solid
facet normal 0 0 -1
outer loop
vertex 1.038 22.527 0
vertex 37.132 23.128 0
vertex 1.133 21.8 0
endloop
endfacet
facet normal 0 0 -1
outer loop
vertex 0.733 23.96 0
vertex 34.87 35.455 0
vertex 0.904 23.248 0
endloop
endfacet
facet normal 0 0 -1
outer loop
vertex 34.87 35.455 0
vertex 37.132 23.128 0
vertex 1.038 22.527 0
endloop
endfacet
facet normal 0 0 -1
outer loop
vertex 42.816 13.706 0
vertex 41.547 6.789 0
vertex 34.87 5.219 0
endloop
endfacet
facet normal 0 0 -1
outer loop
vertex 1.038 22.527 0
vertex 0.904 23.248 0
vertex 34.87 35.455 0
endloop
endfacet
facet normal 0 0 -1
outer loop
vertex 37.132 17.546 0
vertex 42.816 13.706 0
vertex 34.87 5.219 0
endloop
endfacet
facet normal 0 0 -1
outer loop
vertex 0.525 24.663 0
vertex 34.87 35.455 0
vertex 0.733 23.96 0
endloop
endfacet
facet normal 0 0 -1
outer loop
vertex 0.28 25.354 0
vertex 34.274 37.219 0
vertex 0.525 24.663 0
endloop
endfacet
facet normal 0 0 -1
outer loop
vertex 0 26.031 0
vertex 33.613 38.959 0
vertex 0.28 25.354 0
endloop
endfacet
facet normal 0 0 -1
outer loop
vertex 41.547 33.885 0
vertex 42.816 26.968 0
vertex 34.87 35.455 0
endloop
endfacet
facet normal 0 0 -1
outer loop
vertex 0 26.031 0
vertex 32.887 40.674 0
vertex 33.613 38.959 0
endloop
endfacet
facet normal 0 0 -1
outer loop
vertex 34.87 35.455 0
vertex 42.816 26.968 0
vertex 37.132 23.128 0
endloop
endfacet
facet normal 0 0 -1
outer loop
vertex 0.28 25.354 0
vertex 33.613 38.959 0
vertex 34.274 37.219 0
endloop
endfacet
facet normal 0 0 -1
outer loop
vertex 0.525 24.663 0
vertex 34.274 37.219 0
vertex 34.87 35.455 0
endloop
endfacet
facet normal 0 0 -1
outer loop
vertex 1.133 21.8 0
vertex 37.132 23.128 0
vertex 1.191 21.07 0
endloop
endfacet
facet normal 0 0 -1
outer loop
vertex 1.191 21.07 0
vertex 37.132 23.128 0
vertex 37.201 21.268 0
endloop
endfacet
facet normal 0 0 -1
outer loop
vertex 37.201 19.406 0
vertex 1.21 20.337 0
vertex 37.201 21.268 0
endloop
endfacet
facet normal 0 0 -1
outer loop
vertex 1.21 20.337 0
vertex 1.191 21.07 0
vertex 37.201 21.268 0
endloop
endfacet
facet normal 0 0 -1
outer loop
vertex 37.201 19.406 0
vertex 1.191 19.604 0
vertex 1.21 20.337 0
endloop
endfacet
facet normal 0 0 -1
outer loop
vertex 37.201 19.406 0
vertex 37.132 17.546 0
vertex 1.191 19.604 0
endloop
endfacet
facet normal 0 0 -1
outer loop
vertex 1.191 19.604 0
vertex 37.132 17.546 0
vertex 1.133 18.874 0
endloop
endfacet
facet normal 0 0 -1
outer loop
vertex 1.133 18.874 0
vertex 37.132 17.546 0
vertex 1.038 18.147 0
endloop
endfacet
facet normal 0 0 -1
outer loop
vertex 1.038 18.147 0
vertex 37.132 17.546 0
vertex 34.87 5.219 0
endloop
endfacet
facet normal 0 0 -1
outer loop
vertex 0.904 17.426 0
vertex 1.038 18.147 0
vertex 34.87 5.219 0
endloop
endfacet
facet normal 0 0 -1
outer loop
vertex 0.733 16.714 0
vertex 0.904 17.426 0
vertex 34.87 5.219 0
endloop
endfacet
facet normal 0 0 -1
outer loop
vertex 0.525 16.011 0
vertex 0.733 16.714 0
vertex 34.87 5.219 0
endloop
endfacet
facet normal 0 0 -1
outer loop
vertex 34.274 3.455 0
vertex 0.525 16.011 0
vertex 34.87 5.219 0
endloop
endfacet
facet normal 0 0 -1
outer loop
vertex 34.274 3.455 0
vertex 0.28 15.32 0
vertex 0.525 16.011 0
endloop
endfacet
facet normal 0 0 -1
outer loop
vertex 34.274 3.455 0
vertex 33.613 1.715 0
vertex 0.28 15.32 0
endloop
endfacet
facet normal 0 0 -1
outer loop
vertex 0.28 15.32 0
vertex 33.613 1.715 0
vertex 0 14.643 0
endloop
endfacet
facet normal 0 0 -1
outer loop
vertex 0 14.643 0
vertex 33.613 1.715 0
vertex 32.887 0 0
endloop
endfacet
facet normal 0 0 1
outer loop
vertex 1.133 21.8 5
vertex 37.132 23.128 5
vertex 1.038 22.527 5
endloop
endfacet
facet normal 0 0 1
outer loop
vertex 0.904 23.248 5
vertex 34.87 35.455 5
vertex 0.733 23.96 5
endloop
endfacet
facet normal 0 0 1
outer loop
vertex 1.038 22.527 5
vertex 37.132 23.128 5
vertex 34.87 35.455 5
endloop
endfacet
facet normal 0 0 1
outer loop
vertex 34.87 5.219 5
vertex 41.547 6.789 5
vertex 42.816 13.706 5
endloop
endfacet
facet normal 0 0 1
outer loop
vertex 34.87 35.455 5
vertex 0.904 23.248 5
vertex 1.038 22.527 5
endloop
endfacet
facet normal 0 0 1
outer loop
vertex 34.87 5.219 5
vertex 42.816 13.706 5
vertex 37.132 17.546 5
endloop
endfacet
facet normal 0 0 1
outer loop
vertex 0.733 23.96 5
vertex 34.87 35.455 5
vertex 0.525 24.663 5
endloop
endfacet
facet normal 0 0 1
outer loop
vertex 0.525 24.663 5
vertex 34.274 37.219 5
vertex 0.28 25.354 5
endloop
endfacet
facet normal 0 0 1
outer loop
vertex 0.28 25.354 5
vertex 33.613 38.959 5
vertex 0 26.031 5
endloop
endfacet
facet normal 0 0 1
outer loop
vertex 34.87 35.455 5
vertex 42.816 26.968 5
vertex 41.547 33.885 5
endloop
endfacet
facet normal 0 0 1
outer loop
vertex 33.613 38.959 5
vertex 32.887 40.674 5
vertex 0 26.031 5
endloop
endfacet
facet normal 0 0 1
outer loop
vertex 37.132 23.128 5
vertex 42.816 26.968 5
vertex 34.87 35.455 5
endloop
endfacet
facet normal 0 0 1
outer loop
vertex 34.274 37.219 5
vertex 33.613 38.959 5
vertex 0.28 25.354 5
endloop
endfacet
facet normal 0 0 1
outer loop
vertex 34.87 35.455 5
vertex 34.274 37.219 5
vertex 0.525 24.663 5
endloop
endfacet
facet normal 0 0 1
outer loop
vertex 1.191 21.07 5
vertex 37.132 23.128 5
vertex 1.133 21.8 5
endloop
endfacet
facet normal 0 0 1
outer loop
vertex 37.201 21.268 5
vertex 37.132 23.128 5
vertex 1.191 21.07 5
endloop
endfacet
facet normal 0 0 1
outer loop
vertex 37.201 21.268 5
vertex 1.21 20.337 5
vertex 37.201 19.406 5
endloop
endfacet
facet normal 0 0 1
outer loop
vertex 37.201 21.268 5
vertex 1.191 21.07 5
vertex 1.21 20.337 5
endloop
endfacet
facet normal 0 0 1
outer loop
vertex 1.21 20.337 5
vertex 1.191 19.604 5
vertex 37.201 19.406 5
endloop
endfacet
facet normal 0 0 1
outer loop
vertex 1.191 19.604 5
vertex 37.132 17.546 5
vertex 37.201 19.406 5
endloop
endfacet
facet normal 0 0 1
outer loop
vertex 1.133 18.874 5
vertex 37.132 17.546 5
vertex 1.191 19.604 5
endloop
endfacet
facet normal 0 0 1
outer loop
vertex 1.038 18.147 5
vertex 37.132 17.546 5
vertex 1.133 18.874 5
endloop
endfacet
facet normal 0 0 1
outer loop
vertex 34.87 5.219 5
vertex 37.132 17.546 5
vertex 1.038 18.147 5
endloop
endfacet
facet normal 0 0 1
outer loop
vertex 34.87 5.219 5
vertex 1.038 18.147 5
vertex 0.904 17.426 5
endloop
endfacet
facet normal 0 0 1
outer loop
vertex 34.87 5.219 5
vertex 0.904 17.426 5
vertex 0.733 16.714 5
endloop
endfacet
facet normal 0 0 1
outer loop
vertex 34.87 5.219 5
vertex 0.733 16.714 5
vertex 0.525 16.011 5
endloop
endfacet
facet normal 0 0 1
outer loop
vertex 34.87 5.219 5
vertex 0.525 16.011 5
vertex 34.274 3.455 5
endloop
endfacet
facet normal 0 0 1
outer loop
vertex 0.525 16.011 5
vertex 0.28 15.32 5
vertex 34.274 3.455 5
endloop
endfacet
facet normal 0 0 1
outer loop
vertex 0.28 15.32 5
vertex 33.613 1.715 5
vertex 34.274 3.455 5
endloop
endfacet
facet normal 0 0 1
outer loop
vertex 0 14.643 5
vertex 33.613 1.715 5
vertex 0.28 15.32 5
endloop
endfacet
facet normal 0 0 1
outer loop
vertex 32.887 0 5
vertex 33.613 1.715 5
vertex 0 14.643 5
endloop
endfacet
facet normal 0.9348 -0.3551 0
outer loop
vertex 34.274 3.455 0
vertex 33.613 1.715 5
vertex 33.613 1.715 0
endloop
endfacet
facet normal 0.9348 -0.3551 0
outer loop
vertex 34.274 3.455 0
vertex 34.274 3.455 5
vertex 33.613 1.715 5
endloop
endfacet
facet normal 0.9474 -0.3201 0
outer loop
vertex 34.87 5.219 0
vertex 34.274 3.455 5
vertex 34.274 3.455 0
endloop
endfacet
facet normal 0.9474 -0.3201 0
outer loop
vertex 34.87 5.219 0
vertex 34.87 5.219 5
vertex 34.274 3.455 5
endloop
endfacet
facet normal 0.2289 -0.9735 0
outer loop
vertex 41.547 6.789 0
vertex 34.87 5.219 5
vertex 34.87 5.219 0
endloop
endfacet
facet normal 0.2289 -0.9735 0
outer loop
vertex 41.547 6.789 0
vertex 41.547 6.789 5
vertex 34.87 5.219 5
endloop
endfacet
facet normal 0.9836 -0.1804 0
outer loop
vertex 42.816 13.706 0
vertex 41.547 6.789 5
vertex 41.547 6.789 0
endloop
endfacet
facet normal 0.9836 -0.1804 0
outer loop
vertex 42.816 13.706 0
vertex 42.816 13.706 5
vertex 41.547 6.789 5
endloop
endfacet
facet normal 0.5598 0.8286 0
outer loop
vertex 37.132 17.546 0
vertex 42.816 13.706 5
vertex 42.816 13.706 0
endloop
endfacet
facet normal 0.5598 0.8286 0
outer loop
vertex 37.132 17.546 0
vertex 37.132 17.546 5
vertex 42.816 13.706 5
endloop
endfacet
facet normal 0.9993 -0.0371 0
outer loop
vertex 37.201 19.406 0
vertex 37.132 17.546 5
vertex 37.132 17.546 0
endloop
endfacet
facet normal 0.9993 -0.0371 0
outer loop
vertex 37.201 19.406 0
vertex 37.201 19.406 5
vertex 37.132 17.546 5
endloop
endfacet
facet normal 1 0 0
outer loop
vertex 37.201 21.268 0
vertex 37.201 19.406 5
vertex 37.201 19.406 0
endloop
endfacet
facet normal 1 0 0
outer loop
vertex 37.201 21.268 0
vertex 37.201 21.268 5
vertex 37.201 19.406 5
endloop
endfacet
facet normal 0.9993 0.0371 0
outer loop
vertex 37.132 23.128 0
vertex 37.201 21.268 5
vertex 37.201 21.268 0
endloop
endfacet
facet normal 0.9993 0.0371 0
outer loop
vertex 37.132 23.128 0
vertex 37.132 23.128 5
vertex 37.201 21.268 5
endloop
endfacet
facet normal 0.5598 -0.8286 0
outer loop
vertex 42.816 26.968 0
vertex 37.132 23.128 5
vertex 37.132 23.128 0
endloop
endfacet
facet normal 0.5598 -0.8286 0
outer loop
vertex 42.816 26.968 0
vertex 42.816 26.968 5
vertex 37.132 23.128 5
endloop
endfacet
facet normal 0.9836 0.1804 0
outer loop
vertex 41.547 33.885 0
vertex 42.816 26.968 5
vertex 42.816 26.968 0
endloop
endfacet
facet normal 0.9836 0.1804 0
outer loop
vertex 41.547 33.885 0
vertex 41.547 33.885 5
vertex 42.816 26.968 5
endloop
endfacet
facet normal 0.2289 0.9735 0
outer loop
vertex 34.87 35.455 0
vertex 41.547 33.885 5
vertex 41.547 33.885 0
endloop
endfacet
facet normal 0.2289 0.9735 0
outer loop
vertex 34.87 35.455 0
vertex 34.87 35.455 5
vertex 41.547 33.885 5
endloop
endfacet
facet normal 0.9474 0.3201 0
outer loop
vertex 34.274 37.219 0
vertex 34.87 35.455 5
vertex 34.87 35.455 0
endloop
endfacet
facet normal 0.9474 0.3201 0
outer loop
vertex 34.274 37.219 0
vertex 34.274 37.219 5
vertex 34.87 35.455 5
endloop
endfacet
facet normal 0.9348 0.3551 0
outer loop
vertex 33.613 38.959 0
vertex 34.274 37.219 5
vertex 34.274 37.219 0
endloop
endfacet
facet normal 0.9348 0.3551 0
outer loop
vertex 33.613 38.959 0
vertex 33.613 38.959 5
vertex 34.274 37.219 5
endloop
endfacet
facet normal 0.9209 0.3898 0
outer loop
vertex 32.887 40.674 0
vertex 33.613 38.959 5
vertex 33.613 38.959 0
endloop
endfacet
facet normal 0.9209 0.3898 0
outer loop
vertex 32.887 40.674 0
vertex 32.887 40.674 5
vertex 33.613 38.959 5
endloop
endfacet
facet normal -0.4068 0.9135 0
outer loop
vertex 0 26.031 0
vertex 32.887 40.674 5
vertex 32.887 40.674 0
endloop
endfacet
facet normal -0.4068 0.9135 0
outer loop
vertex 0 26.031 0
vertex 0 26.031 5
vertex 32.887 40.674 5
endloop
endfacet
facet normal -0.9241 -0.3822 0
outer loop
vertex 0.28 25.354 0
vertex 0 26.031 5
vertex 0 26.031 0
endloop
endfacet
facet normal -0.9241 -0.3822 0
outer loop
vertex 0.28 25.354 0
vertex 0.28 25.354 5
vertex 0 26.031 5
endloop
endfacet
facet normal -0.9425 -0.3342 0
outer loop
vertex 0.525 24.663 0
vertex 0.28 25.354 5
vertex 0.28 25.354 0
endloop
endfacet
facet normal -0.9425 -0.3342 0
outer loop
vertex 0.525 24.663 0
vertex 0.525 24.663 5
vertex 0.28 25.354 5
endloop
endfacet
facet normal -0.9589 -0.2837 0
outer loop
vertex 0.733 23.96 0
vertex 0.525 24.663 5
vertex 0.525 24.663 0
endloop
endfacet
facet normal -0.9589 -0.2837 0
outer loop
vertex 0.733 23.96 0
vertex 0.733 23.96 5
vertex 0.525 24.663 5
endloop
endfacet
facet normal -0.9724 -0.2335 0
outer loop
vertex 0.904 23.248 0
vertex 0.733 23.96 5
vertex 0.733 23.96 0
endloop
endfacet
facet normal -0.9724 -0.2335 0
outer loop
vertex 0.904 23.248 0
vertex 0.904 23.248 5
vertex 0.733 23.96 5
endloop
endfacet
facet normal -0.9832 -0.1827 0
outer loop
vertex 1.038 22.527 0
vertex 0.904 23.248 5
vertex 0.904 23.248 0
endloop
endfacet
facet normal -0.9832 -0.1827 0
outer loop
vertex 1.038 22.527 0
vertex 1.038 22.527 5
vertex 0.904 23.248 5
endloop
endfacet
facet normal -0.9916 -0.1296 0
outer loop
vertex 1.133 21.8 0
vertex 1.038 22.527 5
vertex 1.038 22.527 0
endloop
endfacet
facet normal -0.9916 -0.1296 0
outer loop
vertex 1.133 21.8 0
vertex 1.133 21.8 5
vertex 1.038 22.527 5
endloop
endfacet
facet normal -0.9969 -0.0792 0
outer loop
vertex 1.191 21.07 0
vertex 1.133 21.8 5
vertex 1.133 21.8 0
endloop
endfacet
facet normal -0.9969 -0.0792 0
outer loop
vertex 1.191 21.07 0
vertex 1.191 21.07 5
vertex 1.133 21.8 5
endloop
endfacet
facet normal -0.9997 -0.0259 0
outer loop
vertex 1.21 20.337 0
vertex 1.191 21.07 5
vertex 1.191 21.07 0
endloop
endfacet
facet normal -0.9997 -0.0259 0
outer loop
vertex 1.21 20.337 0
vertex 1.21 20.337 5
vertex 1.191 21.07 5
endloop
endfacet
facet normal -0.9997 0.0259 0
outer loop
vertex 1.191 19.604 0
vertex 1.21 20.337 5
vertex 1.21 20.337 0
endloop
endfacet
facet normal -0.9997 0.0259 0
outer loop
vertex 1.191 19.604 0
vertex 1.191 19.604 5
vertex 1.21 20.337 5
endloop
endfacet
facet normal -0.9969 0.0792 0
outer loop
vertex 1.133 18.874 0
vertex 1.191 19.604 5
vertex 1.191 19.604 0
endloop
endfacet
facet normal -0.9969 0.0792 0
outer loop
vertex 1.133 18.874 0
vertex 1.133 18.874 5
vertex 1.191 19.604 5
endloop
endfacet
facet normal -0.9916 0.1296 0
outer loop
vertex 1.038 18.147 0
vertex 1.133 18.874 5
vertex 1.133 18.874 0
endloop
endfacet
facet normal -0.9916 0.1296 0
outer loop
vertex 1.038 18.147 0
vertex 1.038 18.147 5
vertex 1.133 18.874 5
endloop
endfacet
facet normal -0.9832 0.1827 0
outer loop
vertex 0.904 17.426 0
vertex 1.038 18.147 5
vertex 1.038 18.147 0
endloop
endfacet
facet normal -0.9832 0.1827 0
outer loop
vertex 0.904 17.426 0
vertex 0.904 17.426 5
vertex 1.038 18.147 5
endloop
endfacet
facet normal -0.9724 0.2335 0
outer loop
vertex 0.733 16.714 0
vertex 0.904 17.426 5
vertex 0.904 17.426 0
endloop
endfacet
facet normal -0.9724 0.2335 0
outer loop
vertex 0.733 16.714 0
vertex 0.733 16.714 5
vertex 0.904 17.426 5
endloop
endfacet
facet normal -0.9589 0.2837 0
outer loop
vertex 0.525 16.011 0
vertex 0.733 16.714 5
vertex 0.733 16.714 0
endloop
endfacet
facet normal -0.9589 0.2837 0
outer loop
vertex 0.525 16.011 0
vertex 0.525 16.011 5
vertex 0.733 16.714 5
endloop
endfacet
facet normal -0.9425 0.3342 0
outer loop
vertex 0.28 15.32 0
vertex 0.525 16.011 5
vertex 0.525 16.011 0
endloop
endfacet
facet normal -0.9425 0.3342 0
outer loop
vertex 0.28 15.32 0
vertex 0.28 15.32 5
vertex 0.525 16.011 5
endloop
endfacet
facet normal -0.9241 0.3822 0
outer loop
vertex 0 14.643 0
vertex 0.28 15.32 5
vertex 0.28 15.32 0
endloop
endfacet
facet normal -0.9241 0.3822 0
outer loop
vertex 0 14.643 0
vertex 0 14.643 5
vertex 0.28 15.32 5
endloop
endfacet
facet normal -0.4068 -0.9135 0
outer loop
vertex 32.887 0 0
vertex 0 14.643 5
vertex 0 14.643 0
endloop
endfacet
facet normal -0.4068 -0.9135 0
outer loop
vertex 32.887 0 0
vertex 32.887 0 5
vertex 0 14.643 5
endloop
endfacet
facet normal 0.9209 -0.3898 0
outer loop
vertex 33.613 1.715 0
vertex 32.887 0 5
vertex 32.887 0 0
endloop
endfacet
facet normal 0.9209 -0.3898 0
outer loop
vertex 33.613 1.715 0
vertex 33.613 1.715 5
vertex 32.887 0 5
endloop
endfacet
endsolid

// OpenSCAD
$fn = 32;

// ----------------------------------------------------------------------
// Gear sector: 2 teeth on 48 degrees
// ----------------------------------------------------------------------

// --- parameters (mm) ---
sector_angle = 48;        // sector angle, degrees
root_r = 50;              // root circle radius
tooth_h = 6;              // tooth height over the root circle
teeth = 2;                // number of teeth on the sector
hub_r = 14;               // hub bore radius
plate_t = 5;              // sector thickness, Z
arc_step = 3;             // sampling step of the root/hub arcs, degrees

tip_r = root_r + tooth_h;  // tip circle radius

profile = [[32.887, 0], [33.613, 1.715], [34.274, 3.455], [34.87, 5.219], [41.547, 6.789], [42.816, 13.706], [37.132, 17.546], [37.201, 19.406], [37.201, 21.268], [37.132, 23.128], [42.816, 26.968], [41.547, 33.885], [34.87, 35.455], [34.274, 37.219], [33.613, 38.959], [32.887, 40.674], [0, 26.031], [0.28, 25.354], [0.525, 24.663], [0.733, 23.96], [0.904, 23.248], [1.038, 22.527], [1.133, 21.8], [1.191, 21.07], [1.21, 20.337], [1.191, 19.604], [1.133, 18.874], [1.038, 18.147], [0.904, 17.426], [0.733, 16.714], [0.525, 16.011], [0.28, 15.32], [0, 14.643]];  // primary outline, 33 points, counter clockwise

// --- the one profile operation ---
linear_extrude(height = plate_t) polygon(points = profile);
